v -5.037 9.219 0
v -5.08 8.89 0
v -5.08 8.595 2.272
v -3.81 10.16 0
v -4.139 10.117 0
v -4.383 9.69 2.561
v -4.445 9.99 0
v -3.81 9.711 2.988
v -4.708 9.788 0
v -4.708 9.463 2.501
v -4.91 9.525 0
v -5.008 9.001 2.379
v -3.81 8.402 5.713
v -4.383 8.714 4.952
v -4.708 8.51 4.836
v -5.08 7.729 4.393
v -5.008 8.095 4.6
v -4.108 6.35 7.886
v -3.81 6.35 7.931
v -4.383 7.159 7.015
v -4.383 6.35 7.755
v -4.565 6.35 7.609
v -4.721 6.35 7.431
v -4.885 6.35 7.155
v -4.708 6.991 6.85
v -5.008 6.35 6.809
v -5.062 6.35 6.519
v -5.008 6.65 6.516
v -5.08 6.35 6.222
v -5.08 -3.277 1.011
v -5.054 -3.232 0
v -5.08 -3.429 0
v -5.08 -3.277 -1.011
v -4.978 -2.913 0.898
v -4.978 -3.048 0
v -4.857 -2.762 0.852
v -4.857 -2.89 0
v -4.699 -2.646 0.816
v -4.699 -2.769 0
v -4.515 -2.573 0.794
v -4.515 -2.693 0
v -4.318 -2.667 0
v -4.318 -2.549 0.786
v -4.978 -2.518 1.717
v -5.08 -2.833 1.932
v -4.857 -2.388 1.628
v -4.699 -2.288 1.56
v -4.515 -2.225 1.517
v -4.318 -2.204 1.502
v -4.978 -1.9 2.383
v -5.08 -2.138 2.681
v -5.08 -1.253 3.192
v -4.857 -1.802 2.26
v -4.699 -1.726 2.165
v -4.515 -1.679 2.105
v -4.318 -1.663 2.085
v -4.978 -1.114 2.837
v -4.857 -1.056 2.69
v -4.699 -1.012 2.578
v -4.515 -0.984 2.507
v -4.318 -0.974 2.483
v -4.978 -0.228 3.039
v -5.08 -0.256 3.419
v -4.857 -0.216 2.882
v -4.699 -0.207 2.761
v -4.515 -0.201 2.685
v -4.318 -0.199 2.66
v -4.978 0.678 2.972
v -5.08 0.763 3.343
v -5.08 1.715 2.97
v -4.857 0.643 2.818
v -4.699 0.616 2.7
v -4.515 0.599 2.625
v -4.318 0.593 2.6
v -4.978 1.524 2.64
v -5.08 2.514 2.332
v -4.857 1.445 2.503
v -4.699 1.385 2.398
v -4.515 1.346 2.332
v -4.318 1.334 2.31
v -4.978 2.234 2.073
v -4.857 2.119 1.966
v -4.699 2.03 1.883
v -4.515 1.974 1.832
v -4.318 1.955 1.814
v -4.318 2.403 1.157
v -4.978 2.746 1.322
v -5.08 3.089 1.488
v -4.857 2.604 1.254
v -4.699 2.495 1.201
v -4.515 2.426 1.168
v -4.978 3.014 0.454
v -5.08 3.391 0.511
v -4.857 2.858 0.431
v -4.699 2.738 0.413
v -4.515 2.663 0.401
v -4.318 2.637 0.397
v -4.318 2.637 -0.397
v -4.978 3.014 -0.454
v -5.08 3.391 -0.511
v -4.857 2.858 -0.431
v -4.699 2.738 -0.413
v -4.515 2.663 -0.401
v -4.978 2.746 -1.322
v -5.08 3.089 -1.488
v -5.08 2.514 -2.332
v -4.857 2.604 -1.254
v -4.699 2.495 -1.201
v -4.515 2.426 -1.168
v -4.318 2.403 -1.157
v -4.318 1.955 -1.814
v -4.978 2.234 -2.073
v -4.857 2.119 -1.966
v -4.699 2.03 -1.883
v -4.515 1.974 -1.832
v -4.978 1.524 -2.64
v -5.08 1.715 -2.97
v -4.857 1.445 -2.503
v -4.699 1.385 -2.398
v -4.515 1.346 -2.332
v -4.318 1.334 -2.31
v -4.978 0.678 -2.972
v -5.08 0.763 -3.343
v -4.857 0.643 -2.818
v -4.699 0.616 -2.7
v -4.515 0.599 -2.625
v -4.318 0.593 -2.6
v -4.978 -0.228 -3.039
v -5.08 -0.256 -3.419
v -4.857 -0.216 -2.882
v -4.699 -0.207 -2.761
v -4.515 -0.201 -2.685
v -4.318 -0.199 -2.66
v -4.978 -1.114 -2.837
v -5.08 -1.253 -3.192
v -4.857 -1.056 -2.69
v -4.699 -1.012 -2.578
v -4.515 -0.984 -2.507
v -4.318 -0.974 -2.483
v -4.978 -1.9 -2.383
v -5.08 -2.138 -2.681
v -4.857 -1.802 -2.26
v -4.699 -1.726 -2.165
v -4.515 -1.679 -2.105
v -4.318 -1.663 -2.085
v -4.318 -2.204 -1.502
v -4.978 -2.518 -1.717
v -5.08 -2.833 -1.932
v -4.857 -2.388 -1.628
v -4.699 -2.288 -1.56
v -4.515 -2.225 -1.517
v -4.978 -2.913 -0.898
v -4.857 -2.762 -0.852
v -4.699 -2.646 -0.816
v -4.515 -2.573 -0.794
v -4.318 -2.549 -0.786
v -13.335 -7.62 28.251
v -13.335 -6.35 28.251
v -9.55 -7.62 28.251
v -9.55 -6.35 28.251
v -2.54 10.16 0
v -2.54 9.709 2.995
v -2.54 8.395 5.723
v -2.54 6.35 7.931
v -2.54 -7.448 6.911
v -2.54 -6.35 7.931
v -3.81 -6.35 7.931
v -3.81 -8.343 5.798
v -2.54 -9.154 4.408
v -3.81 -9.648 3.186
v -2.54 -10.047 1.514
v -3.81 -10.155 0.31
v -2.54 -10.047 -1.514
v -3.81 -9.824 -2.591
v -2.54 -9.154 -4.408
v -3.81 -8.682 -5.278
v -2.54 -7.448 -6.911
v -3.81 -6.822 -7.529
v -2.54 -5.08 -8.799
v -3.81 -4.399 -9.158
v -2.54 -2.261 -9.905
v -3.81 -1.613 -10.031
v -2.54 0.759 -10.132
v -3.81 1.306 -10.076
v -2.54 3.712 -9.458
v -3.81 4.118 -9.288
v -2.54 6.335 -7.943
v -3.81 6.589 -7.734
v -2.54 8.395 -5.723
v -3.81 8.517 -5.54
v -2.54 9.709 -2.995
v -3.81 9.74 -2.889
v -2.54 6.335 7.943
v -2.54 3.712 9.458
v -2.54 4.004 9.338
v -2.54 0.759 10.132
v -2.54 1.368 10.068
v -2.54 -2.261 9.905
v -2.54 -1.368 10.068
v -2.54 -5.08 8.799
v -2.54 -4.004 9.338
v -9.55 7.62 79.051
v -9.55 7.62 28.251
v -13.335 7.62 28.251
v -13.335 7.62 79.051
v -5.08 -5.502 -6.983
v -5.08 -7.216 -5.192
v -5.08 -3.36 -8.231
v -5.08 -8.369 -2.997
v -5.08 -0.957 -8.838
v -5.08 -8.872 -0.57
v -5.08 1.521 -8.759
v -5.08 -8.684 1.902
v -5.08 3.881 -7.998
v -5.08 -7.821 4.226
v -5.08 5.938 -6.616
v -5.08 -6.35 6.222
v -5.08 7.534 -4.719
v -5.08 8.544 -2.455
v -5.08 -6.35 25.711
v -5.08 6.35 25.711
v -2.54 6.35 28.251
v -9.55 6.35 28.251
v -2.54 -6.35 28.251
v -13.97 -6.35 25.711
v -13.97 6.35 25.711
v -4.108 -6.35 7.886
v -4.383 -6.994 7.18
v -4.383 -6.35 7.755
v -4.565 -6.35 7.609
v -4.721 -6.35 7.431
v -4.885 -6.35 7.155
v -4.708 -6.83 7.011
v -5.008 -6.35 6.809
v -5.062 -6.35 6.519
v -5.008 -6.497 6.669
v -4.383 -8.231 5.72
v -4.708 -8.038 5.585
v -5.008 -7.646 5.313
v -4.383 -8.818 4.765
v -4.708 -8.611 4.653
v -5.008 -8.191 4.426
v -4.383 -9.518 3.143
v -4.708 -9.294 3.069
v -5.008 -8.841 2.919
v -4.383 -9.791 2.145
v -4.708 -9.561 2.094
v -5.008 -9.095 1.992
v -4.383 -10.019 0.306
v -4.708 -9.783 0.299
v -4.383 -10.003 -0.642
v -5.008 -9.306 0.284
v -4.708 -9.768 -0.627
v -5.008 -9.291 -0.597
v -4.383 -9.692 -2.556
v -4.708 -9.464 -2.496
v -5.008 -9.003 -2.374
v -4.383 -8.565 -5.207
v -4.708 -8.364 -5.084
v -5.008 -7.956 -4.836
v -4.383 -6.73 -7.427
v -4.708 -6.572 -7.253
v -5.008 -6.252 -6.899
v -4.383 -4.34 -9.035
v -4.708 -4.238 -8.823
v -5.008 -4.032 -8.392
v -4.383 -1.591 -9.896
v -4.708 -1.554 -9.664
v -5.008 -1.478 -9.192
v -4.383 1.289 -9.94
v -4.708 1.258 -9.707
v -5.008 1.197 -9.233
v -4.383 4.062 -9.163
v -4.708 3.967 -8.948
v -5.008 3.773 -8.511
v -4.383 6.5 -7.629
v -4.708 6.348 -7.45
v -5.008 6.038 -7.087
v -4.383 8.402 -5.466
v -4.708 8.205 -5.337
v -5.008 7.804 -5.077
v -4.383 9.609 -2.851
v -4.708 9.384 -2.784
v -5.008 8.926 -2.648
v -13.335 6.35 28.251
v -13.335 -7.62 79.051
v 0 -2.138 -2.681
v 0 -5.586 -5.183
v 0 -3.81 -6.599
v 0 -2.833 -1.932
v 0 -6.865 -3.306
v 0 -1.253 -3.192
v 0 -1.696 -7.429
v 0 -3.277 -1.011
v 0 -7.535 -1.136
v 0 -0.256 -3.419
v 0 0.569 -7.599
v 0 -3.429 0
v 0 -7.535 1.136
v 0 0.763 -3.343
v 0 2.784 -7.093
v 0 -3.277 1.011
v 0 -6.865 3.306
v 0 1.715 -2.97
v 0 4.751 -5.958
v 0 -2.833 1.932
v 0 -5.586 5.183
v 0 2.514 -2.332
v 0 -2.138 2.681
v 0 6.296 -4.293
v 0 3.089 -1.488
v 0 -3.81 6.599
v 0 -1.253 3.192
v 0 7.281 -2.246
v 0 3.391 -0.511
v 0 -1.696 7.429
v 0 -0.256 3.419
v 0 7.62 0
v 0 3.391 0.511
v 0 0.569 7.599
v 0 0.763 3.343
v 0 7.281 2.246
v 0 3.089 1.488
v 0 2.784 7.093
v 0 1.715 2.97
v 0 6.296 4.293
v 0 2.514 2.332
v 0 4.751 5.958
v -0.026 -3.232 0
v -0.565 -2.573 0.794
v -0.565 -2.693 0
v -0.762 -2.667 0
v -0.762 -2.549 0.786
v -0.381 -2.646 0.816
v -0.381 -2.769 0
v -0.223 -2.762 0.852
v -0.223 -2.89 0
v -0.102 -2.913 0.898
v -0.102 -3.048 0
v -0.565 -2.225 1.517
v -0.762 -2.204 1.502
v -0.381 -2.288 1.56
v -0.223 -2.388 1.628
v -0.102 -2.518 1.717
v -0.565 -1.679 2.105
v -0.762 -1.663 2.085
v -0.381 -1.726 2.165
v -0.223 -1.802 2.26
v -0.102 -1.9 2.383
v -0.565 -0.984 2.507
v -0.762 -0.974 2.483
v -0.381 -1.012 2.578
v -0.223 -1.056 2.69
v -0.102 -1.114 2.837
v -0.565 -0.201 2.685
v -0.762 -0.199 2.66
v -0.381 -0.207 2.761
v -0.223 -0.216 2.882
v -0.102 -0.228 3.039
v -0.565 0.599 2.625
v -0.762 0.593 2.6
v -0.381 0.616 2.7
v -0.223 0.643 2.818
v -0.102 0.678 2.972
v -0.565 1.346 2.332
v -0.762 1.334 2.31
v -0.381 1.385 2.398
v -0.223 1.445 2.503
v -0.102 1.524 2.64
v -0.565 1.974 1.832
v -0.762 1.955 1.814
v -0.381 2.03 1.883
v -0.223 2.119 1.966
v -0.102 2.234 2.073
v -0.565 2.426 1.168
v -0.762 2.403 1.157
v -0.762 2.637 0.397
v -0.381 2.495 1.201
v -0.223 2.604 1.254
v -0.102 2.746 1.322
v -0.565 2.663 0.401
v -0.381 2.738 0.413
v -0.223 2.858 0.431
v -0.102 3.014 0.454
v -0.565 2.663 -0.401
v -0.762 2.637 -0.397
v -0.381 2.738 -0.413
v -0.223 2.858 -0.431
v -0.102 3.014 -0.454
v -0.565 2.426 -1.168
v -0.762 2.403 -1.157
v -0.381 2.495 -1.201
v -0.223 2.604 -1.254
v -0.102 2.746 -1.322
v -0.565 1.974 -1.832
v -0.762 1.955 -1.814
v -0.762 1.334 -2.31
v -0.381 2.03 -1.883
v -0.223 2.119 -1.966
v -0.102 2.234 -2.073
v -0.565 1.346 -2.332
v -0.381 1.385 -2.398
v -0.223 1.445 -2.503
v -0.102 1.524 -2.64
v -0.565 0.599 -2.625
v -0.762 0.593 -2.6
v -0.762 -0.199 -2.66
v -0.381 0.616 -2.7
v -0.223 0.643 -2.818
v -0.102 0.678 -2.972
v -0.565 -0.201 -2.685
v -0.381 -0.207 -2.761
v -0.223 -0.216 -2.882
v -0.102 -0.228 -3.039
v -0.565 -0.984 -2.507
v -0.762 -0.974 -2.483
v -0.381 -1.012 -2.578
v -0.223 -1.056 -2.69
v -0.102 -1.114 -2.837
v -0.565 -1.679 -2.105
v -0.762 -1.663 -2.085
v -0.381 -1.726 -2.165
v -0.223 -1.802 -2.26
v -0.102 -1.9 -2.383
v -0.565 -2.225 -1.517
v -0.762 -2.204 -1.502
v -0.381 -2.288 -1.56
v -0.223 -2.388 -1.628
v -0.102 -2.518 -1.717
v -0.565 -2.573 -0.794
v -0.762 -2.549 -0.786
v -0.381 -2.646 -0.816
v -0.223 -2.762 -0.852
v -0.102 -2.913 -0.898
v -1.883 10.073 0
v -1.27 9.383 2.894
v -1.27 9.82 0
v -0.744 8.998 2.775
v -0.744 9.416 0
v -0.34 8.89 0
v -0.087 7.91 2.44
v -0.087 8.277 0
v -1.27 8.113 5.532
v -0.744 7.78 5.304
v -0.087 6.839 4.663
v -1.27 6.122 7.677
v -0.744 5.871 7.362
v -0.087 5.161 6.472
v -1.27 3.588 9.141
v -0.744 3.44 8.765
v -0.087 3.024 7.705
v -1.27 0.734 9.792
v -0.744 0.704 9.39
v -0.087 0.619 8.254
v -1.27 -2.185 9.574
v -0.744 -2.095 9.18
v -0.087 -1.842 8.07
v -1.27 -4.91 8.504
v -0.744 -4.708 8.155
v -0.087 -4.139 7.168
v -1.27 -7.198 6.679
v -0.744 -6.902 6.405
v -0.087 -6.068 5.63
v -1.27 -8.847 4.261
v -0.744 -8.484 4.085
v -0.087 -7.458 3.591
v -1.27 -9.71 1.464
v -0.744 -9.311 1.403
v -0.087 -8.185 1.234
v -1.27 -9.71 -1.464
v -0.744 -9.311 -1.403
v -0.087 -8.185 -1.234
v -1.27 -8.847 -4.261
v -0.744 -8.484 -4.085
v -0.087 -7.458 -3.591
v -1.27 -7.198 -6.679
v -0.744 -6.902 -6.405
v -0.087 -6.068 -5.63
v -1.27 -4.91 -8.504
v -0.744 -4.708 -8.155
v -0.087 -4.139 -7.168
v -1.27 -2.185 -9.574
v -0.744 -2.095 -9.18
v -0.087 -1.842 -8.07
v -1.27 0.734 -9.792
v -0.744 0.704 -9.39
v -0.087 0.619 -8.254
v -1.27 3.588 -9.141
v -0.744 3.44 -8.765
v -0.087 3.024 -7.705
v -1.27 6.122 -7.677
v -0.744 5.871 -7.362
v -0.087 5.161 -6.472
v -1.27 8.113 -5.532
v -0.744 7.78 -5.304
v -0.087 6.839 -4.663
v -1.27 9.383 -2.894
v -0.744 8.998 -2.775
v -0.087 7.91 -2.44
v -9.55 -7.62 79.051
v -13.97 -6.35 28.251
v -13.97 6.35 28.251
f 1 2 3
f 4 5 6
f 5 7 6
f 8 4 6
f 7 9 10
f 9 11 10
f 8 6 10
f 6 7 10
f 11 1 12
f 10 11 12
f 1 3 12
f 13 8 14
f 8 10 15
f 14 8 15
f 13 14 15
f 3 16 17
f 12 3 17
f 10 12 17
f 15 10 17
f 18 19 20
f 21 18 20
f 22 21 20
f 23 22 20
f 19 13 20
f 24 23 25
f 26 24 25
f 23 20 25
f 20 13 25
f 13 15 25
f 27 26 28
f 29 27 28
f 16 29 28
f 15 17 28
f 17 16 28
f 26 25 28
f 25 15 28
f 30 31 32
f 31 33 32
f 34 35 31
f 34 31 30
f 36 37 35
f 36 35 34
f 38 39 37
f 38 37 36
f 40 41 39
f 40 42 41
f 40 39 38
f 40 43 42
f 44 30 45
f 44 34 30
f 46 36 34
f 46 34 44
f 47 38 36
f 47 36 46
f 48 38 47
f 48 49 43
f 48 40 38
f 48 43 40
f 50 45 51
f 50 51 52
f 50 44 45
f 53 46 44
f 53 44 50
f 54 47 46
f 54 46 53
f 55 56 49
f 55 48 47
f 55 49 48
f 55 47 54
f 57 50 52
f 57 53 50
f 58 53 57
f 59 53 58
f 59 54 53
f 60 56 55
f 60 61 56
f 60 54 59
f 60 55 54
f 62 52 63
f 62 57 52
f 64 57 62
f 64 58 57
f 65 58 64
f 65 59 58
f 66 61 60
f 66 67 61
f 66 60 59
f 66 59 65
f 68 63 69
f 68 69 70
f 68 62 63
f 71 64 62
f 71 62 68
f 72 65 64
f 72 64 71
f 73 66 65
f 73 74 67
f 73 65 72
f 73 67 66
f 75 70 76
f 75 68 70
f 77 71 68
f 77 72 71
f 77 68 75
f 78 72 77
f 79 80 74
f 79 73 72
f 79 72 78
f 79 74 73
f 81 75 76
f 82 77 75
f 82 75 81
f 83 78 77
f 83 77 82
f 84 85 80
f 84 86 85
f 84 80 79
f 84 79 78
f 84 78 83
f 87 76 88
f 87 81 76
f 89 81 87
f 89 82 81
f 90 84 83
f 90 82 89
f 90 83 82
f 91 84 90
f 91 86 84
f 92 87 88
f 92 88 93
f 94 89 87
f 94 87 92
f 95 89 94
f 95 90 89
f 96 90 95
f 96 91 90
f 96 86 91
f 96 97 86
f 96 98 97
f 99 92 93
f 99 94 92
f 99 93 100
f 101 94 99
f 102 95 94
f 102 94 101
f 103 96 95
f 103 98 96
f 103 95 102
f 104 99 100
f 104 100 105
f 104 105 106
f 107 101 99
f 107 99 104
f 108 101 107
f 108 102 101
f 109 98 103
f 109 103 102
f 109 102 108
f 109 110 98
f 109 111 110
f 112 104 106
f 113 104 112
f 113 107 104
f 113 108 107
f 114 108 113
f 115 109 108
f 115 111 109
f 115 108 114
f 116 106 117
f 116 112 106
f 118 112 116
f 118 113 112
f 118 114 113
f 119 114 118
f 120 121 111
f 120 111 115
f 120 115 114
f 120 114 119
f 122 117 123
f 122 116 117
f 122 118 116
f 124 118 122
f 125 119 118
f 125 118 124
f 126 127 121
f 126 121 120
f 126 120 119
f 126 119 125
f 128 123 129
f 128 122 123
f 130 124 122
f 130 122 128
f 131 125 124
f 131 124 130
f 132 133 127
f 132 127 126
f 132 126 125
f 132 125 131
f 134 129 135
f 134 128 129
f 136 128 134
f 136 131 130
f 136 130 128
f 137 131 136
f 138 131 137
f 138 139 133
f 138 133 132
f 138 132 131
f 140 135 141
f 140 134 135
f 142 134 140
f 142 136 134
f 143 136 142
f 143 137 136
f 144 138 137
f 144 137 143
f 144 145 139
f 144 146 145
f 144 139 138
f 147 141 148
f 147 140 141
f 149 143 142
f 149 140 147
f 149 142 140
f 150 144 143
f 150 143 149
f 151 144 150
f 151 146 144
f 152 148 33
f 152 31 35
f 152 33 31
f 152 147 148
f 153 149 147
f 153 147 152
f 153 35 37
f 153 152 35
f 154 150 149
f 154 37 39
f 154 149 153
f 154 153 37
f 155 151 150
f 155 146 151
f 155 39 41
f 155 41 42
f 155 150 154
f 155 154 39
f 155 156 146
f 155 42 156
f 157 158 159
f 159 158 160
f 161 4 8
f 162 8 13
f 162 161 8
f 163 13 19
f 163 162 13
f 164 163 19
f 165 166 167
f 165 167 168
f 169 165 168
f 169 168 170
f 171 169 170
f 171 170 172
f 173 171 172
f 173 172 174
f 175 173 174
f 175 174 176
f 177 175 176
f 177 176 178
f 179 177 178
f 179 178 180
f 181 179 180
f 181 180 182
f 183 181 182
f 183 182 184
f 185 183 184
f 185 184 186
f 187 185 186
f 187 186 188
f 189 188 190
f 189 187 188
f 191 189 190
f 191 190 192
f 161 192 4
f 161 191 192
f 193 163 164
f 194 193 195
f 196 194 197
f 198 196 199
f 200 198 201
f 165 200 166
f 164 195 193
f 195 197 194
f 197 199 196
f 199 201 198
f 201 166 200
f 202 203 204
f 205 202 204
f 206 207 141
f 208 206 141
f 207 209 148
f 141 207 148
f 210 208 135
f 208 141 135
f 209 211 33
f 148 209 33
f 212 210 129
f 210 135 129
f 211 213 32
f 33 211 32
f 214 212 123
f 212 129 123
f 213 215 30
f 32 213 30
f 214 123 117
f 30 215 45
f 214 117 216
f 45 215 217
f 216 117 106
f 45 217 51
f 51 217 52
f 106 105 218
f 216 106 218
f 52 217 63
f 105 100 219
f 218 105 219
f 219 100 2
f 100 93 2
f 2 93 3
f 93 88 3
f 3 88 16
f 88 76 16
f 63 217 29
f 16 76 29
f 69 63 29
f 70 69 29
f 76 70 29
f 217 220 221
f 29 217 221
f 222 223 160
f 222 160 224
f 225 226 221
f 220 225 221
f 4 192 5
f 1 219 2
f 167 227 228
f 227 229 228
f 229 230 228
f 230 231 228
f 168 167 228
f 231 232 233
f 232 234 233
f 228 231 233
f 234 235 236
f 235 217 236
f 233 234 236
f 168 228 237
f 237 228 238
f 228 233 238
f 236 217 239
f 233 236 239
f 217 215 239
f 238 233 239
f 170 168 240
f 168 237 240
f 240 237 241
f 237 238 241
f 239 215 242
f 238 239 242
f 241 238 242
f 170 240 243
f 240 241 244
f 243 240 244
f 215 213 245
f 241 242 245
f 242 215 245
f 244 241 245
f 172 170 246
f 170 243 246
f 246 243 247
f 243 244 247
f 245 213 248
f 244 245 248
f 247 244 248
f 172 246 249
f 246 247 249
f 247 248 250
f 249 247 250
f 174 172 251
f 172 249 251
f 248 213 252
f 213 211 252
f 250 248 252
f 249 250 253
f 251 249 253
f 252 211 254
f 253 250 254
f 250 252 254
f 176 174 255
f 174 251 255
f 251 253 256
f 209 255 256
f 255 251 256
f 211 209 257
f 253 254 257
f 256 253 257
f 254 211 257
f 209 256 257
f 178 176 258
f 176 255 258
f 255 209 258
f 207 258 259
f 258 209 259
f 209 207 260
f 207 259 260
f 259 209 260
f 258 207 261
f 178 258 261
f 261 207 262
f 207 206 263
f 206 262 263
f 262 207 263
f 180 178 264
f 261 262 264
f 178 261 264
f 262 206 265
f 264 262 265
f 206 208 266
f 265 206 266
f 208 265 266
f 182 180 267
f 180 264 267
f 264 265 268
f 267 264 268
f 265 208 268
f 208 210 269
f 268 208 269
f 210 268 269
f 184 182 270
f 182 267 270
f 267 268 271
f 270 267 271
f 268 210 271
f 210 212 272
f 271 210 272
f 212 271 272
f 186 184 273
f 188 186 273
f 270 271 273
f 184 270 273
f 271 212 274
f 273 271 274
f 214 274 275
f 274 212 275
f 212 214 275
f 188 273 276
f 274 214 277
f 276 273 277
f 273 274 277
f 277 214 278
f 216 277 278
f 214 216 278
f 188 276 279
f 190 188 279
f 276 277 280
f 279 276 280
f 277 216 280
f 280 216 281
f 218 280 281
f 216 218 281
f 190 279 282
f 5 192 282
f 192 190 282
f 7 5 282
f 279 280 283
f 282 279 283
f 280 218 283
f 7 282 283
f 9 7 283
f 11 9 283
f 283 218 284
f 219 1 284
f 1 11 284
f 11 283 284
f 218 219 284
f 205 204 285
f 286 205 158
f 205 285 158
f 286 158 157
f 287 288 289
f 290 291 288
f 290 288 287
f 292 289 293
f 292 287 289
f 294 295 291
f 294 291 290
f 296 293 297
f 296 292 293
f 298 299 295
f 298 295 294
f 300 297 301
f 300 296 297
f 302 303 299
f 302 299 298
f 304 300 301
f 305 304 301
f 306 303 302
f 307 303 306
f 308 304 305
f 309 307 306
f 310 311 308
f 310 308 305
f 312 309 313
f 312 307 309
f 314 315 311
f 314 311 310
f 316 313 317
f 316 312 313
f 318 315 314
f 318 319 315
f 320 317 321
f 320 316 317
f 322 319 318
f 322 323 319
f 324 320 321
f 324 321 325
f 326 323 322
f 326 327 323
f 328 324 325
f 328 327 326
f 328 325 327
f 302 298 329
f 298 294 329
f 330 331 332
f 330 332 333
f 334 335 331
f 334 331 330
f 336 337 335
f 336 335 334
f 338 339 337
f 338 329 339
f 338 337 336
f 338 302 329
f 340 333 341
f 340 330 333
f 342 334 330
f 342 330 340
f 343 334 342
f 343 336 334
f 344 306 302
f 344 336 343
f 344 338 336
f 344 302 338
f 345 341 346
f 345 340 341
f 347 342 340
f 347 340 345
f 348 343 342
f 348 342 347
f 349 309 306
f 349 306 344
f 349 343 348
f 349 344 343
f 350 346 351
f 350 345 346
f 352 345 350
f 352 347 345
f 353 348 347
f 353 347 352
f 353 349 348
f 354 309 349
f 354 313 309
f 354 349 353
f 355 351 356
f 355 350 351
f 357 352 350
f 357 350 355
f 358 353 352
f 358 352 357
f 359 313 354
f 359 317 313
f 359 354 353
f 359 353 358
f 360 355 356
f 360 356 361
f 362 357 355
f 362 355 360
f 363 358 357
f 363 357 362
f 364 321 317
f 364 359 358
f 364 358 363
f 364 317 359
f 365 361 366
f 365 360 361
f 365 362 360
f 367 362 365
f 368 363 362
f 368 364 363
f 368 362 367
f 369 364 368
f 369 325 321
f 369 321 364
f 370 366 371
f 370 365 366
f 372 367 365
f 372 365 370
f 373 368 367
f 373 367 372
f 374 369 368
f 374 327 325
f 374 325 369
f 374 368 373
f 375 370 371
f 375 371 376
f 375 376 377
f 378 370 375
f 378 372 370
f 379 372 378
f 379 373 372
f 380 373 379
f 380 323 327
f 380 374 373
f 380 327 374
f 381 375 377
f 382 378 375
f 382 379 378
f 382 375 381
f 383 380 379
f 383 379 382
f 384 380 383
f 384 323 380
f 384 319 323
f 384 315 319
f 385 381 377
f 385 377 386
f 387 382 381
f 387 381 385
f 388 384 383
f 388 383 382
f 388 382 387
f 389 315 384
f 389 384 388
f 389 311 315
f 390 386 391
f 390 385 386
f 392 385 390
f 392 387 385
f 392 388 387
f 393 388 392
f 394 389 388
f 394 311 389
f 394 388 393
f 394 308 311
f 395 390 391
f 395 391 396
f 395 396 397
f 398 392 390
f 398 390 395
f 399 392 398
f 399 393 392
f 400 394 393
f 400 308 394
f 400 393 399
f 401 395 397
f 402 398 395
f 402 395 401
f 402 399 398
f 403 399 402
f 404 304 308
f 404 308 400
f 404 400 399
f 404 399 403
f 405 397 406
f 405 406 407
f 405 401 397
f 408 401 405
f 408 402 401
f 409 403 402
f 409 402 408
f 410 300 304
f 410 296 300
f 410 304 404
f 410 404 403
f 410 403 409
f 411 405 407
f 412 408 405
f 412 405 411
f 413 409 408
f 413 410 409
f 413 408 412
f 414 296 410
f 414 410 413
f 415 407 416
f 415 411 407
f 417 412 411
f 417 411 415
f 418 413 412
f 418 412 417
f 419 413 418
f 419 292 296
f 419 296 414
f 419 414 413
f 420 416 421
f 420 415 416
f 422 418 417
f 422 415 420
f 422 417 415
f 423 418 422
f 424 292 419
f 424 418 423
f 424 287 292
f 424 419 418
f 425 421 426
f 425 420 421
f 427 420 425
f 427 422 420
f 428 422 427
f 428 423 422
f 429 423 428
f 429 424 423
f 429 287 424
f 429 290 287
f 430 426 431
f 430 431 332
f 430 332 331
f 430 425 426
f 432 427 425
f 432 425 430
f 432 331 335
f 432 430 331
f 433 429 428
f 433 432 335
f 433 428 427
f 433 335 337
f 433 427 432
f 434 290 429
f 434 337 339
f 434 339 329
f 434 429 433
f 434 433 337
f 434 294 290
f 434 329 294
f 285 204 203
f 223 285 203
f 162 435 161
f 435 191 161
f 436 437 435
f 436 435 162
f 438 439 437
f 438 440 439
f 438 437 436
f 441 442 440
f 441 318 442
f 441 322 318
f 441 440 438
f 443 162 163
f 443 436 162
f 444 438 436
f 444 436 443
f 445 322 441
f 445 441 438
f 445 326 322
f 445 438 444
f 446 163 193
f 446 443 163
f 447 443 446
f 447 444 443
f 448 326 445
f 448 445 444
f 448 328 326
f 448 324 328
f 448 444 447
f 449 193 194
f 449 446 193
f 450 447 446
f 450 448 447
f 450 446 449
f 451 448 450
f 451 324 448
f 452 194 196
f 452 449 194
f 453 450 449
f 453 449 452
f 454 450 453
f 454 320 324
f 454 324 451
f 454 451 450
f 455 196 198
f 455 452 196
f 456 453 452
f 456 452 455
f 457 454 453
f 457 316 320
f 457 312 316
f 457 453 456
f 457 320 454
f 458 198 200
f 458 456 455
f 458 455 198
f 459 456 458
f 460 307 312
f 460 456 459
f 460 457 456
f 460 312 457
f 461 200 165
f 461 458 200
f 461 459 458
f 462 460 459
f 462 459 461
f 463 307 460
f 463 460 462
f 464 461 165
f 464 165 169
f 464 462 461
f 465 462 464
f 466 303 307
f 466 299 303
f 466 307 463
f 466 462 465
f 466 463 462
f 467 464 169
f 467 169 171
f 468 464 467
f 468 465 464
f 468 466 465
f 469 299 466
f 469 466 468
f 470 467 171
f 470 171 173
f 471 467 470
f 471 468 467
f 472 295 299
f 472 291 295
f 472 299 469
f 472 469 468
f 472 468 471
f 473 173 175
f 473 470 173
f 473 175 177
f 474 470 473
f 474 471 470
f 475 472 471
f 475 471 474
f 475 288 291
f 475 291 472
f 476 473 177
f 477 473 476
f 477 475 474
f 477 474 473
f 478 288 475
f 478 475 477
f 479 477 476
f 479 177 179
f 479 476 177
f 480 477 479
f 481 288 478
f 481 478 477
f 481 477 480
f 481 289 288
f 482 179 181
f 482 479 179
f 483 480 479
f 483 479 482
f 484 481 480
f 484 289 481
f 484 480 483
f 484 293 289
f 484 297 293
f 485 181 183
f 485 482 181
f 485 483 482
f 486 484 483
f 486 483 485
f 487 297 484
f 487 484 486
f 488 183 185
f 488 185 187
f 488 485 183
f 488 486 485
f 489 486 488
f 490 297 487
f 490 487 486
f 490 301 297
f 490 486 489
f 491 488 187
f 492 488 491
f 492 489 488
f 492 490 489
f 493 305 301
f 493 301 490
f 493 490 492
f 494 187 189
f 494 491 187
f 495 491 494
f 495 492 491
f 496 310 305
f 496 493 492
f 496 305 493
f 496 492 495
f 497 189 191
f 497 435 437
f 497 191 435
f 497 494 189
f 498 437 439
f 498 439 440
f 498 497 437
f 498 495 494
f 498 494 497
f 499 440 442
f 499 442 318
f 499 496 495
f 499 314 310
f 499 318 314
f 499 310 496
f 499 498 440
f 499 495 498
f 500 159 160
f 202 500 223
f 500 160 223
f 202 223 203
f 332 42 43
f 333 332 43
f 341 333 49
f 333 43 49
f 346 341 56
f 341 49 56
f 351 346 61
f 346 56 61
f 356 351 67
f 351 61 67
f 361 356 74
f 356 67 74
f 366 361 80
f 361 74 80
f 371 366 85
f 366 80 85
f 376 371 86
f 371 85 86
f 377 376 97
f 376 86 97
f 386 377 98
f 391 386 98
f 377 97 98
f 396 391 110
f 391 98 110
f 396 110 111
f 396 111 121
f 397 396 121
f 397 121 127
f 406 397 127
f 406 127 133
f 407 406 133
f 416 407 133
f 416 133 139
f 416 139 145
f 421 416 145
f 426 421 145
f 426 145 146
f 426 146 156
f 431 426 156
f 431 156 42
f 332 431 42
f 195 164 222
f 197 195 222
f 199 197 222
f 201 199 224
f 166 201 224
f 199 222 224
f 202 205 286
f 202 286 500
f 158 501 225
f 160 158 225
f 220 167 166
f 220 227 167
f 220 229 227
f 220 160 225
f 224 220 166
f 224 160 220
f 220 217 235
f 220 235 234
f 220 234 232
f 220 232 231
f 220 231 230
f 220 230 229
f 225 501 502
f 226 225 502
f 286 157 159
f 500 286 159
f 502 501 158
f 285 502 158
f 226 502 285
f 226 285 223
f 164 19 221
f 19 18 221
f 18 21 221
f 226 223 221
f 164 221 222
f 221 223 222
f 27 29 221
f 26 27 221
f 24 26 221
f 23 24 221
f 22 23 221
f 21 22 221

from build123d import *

# Parameters (mm, degrees)
F0_R      = 10.16
F1_DEPTH  = 2.54
F2_R      = 2.667
F3_DEPTH  = 26.02296
F4_R      = 10.16
F5_DEPTH  = 5.08
F7_R      = 2.667
F8_DEPTH  = 61.29661
F9_DEPTH  = 2.54
F10_W     = 8.89
F10_H     = 12.7
F11_DEPTH = 2.54
F13_DEPTH = 50.8
F14_R     = 2.53999
F15_R     = 1.27
F16_R     = 0.762


# Not quite as in the source:
# - a fillet or chamfer is up to 0.001 mm smaller than in the source, because OpenCascade refuses the exact size


with BuildPart() as f1:
    # F0 (on Right) → F1 (new body)
    with BuildSketch(Plane.YZ):
        Circle(F0_R)
    extrude(amount=-F1_DEPTH)

    # F2 (on face) → F3 (cut)
    with BuildSketch(Plane(origin=(-2.54, 0, 0), x_dir=(0, -1, 0), z_dir=(-1, 0, 0))):
        Circle(F2_R)
    extrude(amount=-F3_DEPTH, mode=Mode.SUBTRACT)

    # F4 (on Right) → F5 (join)
    with BuildSketch(Plane.YZ):
        Circle(F4_R)
    extrude(amount=-F5_DEPTH)

    # F7 (on face) → F8 (cut)
    with BuildSketch(Plane(origin=(-5.08, 0, 0), x_dir=(0, -1, 0), z_dir=(-1, 0, 0))):
        Circle(F7_R)
    extrude(amount=-F8_DEPTH, mode=Mode.SUBTRACT)

    # F6 (on face) → F9 (join)
    with BuildSketch(Plane(origin=(-5.08, 0, 0), x_dir=(0, -1, 0), z_dir=(-1, 0, 0))):
        with BuildLine():
            Line((-6.35, 28.251147458), (-6.35, 7.931147458))
            ThreePointArc((-6.35, 7.931147458), (0, 10.16), (6.35, 7.931147458))
            Line((6.35, 7.931147458), (6.35, 28.251147458))
            Line((6.35, 28.251147458), (-6.35, 28.251147458))
        make_face()
    extrude(amount=-F9_DEPTH)

    # F10 (on face) → F11 (join)
    with BuildSketch(Plane.XY.offset(28.251147458)):
        with Locations((-9.525, 0)):
            Rectangle(F10_W, F10_H)
    extrude(amount=-F11_DEPTH)

    # F12 (on face) → F13 (join)
    with BuildSketch(Plane.XY.offset(28.251147458)):
        Polygon((-9.5504, 7.62), (-13.335, 7.62), (-13.335, -7.62), (-9.5504, -7.62), (-9.5504, 0), align=None)
    extrude(amount=F13_DEPTH)

    # F14 (radius 2.54 in the source; OpenCascade refuses exactly that, so slightly less here)
    f14_edges = [f1.edges().sort_by_distance(p)[0] for p in [
        (0, -10.16, 0),
    ]]
    fillet(f14_edges, radius=F14_R)

    # F15
    f15_edges = [f1.edges().sort_by_distance(p)[0] for p in [
        (-5.08, -4.399409, -9.1581),
    ]]
    fillet(f15_edges, radius=F15_R)

    # F16
    f16_edges = [f1.edges().sort_by_distance(p)[0] for p in [
        (-5.08, 2.667, 0),
        (0, 2.667, 0),
    ]]
    fillet(f16_edges, radius=F16_R)


solid = f1.part
